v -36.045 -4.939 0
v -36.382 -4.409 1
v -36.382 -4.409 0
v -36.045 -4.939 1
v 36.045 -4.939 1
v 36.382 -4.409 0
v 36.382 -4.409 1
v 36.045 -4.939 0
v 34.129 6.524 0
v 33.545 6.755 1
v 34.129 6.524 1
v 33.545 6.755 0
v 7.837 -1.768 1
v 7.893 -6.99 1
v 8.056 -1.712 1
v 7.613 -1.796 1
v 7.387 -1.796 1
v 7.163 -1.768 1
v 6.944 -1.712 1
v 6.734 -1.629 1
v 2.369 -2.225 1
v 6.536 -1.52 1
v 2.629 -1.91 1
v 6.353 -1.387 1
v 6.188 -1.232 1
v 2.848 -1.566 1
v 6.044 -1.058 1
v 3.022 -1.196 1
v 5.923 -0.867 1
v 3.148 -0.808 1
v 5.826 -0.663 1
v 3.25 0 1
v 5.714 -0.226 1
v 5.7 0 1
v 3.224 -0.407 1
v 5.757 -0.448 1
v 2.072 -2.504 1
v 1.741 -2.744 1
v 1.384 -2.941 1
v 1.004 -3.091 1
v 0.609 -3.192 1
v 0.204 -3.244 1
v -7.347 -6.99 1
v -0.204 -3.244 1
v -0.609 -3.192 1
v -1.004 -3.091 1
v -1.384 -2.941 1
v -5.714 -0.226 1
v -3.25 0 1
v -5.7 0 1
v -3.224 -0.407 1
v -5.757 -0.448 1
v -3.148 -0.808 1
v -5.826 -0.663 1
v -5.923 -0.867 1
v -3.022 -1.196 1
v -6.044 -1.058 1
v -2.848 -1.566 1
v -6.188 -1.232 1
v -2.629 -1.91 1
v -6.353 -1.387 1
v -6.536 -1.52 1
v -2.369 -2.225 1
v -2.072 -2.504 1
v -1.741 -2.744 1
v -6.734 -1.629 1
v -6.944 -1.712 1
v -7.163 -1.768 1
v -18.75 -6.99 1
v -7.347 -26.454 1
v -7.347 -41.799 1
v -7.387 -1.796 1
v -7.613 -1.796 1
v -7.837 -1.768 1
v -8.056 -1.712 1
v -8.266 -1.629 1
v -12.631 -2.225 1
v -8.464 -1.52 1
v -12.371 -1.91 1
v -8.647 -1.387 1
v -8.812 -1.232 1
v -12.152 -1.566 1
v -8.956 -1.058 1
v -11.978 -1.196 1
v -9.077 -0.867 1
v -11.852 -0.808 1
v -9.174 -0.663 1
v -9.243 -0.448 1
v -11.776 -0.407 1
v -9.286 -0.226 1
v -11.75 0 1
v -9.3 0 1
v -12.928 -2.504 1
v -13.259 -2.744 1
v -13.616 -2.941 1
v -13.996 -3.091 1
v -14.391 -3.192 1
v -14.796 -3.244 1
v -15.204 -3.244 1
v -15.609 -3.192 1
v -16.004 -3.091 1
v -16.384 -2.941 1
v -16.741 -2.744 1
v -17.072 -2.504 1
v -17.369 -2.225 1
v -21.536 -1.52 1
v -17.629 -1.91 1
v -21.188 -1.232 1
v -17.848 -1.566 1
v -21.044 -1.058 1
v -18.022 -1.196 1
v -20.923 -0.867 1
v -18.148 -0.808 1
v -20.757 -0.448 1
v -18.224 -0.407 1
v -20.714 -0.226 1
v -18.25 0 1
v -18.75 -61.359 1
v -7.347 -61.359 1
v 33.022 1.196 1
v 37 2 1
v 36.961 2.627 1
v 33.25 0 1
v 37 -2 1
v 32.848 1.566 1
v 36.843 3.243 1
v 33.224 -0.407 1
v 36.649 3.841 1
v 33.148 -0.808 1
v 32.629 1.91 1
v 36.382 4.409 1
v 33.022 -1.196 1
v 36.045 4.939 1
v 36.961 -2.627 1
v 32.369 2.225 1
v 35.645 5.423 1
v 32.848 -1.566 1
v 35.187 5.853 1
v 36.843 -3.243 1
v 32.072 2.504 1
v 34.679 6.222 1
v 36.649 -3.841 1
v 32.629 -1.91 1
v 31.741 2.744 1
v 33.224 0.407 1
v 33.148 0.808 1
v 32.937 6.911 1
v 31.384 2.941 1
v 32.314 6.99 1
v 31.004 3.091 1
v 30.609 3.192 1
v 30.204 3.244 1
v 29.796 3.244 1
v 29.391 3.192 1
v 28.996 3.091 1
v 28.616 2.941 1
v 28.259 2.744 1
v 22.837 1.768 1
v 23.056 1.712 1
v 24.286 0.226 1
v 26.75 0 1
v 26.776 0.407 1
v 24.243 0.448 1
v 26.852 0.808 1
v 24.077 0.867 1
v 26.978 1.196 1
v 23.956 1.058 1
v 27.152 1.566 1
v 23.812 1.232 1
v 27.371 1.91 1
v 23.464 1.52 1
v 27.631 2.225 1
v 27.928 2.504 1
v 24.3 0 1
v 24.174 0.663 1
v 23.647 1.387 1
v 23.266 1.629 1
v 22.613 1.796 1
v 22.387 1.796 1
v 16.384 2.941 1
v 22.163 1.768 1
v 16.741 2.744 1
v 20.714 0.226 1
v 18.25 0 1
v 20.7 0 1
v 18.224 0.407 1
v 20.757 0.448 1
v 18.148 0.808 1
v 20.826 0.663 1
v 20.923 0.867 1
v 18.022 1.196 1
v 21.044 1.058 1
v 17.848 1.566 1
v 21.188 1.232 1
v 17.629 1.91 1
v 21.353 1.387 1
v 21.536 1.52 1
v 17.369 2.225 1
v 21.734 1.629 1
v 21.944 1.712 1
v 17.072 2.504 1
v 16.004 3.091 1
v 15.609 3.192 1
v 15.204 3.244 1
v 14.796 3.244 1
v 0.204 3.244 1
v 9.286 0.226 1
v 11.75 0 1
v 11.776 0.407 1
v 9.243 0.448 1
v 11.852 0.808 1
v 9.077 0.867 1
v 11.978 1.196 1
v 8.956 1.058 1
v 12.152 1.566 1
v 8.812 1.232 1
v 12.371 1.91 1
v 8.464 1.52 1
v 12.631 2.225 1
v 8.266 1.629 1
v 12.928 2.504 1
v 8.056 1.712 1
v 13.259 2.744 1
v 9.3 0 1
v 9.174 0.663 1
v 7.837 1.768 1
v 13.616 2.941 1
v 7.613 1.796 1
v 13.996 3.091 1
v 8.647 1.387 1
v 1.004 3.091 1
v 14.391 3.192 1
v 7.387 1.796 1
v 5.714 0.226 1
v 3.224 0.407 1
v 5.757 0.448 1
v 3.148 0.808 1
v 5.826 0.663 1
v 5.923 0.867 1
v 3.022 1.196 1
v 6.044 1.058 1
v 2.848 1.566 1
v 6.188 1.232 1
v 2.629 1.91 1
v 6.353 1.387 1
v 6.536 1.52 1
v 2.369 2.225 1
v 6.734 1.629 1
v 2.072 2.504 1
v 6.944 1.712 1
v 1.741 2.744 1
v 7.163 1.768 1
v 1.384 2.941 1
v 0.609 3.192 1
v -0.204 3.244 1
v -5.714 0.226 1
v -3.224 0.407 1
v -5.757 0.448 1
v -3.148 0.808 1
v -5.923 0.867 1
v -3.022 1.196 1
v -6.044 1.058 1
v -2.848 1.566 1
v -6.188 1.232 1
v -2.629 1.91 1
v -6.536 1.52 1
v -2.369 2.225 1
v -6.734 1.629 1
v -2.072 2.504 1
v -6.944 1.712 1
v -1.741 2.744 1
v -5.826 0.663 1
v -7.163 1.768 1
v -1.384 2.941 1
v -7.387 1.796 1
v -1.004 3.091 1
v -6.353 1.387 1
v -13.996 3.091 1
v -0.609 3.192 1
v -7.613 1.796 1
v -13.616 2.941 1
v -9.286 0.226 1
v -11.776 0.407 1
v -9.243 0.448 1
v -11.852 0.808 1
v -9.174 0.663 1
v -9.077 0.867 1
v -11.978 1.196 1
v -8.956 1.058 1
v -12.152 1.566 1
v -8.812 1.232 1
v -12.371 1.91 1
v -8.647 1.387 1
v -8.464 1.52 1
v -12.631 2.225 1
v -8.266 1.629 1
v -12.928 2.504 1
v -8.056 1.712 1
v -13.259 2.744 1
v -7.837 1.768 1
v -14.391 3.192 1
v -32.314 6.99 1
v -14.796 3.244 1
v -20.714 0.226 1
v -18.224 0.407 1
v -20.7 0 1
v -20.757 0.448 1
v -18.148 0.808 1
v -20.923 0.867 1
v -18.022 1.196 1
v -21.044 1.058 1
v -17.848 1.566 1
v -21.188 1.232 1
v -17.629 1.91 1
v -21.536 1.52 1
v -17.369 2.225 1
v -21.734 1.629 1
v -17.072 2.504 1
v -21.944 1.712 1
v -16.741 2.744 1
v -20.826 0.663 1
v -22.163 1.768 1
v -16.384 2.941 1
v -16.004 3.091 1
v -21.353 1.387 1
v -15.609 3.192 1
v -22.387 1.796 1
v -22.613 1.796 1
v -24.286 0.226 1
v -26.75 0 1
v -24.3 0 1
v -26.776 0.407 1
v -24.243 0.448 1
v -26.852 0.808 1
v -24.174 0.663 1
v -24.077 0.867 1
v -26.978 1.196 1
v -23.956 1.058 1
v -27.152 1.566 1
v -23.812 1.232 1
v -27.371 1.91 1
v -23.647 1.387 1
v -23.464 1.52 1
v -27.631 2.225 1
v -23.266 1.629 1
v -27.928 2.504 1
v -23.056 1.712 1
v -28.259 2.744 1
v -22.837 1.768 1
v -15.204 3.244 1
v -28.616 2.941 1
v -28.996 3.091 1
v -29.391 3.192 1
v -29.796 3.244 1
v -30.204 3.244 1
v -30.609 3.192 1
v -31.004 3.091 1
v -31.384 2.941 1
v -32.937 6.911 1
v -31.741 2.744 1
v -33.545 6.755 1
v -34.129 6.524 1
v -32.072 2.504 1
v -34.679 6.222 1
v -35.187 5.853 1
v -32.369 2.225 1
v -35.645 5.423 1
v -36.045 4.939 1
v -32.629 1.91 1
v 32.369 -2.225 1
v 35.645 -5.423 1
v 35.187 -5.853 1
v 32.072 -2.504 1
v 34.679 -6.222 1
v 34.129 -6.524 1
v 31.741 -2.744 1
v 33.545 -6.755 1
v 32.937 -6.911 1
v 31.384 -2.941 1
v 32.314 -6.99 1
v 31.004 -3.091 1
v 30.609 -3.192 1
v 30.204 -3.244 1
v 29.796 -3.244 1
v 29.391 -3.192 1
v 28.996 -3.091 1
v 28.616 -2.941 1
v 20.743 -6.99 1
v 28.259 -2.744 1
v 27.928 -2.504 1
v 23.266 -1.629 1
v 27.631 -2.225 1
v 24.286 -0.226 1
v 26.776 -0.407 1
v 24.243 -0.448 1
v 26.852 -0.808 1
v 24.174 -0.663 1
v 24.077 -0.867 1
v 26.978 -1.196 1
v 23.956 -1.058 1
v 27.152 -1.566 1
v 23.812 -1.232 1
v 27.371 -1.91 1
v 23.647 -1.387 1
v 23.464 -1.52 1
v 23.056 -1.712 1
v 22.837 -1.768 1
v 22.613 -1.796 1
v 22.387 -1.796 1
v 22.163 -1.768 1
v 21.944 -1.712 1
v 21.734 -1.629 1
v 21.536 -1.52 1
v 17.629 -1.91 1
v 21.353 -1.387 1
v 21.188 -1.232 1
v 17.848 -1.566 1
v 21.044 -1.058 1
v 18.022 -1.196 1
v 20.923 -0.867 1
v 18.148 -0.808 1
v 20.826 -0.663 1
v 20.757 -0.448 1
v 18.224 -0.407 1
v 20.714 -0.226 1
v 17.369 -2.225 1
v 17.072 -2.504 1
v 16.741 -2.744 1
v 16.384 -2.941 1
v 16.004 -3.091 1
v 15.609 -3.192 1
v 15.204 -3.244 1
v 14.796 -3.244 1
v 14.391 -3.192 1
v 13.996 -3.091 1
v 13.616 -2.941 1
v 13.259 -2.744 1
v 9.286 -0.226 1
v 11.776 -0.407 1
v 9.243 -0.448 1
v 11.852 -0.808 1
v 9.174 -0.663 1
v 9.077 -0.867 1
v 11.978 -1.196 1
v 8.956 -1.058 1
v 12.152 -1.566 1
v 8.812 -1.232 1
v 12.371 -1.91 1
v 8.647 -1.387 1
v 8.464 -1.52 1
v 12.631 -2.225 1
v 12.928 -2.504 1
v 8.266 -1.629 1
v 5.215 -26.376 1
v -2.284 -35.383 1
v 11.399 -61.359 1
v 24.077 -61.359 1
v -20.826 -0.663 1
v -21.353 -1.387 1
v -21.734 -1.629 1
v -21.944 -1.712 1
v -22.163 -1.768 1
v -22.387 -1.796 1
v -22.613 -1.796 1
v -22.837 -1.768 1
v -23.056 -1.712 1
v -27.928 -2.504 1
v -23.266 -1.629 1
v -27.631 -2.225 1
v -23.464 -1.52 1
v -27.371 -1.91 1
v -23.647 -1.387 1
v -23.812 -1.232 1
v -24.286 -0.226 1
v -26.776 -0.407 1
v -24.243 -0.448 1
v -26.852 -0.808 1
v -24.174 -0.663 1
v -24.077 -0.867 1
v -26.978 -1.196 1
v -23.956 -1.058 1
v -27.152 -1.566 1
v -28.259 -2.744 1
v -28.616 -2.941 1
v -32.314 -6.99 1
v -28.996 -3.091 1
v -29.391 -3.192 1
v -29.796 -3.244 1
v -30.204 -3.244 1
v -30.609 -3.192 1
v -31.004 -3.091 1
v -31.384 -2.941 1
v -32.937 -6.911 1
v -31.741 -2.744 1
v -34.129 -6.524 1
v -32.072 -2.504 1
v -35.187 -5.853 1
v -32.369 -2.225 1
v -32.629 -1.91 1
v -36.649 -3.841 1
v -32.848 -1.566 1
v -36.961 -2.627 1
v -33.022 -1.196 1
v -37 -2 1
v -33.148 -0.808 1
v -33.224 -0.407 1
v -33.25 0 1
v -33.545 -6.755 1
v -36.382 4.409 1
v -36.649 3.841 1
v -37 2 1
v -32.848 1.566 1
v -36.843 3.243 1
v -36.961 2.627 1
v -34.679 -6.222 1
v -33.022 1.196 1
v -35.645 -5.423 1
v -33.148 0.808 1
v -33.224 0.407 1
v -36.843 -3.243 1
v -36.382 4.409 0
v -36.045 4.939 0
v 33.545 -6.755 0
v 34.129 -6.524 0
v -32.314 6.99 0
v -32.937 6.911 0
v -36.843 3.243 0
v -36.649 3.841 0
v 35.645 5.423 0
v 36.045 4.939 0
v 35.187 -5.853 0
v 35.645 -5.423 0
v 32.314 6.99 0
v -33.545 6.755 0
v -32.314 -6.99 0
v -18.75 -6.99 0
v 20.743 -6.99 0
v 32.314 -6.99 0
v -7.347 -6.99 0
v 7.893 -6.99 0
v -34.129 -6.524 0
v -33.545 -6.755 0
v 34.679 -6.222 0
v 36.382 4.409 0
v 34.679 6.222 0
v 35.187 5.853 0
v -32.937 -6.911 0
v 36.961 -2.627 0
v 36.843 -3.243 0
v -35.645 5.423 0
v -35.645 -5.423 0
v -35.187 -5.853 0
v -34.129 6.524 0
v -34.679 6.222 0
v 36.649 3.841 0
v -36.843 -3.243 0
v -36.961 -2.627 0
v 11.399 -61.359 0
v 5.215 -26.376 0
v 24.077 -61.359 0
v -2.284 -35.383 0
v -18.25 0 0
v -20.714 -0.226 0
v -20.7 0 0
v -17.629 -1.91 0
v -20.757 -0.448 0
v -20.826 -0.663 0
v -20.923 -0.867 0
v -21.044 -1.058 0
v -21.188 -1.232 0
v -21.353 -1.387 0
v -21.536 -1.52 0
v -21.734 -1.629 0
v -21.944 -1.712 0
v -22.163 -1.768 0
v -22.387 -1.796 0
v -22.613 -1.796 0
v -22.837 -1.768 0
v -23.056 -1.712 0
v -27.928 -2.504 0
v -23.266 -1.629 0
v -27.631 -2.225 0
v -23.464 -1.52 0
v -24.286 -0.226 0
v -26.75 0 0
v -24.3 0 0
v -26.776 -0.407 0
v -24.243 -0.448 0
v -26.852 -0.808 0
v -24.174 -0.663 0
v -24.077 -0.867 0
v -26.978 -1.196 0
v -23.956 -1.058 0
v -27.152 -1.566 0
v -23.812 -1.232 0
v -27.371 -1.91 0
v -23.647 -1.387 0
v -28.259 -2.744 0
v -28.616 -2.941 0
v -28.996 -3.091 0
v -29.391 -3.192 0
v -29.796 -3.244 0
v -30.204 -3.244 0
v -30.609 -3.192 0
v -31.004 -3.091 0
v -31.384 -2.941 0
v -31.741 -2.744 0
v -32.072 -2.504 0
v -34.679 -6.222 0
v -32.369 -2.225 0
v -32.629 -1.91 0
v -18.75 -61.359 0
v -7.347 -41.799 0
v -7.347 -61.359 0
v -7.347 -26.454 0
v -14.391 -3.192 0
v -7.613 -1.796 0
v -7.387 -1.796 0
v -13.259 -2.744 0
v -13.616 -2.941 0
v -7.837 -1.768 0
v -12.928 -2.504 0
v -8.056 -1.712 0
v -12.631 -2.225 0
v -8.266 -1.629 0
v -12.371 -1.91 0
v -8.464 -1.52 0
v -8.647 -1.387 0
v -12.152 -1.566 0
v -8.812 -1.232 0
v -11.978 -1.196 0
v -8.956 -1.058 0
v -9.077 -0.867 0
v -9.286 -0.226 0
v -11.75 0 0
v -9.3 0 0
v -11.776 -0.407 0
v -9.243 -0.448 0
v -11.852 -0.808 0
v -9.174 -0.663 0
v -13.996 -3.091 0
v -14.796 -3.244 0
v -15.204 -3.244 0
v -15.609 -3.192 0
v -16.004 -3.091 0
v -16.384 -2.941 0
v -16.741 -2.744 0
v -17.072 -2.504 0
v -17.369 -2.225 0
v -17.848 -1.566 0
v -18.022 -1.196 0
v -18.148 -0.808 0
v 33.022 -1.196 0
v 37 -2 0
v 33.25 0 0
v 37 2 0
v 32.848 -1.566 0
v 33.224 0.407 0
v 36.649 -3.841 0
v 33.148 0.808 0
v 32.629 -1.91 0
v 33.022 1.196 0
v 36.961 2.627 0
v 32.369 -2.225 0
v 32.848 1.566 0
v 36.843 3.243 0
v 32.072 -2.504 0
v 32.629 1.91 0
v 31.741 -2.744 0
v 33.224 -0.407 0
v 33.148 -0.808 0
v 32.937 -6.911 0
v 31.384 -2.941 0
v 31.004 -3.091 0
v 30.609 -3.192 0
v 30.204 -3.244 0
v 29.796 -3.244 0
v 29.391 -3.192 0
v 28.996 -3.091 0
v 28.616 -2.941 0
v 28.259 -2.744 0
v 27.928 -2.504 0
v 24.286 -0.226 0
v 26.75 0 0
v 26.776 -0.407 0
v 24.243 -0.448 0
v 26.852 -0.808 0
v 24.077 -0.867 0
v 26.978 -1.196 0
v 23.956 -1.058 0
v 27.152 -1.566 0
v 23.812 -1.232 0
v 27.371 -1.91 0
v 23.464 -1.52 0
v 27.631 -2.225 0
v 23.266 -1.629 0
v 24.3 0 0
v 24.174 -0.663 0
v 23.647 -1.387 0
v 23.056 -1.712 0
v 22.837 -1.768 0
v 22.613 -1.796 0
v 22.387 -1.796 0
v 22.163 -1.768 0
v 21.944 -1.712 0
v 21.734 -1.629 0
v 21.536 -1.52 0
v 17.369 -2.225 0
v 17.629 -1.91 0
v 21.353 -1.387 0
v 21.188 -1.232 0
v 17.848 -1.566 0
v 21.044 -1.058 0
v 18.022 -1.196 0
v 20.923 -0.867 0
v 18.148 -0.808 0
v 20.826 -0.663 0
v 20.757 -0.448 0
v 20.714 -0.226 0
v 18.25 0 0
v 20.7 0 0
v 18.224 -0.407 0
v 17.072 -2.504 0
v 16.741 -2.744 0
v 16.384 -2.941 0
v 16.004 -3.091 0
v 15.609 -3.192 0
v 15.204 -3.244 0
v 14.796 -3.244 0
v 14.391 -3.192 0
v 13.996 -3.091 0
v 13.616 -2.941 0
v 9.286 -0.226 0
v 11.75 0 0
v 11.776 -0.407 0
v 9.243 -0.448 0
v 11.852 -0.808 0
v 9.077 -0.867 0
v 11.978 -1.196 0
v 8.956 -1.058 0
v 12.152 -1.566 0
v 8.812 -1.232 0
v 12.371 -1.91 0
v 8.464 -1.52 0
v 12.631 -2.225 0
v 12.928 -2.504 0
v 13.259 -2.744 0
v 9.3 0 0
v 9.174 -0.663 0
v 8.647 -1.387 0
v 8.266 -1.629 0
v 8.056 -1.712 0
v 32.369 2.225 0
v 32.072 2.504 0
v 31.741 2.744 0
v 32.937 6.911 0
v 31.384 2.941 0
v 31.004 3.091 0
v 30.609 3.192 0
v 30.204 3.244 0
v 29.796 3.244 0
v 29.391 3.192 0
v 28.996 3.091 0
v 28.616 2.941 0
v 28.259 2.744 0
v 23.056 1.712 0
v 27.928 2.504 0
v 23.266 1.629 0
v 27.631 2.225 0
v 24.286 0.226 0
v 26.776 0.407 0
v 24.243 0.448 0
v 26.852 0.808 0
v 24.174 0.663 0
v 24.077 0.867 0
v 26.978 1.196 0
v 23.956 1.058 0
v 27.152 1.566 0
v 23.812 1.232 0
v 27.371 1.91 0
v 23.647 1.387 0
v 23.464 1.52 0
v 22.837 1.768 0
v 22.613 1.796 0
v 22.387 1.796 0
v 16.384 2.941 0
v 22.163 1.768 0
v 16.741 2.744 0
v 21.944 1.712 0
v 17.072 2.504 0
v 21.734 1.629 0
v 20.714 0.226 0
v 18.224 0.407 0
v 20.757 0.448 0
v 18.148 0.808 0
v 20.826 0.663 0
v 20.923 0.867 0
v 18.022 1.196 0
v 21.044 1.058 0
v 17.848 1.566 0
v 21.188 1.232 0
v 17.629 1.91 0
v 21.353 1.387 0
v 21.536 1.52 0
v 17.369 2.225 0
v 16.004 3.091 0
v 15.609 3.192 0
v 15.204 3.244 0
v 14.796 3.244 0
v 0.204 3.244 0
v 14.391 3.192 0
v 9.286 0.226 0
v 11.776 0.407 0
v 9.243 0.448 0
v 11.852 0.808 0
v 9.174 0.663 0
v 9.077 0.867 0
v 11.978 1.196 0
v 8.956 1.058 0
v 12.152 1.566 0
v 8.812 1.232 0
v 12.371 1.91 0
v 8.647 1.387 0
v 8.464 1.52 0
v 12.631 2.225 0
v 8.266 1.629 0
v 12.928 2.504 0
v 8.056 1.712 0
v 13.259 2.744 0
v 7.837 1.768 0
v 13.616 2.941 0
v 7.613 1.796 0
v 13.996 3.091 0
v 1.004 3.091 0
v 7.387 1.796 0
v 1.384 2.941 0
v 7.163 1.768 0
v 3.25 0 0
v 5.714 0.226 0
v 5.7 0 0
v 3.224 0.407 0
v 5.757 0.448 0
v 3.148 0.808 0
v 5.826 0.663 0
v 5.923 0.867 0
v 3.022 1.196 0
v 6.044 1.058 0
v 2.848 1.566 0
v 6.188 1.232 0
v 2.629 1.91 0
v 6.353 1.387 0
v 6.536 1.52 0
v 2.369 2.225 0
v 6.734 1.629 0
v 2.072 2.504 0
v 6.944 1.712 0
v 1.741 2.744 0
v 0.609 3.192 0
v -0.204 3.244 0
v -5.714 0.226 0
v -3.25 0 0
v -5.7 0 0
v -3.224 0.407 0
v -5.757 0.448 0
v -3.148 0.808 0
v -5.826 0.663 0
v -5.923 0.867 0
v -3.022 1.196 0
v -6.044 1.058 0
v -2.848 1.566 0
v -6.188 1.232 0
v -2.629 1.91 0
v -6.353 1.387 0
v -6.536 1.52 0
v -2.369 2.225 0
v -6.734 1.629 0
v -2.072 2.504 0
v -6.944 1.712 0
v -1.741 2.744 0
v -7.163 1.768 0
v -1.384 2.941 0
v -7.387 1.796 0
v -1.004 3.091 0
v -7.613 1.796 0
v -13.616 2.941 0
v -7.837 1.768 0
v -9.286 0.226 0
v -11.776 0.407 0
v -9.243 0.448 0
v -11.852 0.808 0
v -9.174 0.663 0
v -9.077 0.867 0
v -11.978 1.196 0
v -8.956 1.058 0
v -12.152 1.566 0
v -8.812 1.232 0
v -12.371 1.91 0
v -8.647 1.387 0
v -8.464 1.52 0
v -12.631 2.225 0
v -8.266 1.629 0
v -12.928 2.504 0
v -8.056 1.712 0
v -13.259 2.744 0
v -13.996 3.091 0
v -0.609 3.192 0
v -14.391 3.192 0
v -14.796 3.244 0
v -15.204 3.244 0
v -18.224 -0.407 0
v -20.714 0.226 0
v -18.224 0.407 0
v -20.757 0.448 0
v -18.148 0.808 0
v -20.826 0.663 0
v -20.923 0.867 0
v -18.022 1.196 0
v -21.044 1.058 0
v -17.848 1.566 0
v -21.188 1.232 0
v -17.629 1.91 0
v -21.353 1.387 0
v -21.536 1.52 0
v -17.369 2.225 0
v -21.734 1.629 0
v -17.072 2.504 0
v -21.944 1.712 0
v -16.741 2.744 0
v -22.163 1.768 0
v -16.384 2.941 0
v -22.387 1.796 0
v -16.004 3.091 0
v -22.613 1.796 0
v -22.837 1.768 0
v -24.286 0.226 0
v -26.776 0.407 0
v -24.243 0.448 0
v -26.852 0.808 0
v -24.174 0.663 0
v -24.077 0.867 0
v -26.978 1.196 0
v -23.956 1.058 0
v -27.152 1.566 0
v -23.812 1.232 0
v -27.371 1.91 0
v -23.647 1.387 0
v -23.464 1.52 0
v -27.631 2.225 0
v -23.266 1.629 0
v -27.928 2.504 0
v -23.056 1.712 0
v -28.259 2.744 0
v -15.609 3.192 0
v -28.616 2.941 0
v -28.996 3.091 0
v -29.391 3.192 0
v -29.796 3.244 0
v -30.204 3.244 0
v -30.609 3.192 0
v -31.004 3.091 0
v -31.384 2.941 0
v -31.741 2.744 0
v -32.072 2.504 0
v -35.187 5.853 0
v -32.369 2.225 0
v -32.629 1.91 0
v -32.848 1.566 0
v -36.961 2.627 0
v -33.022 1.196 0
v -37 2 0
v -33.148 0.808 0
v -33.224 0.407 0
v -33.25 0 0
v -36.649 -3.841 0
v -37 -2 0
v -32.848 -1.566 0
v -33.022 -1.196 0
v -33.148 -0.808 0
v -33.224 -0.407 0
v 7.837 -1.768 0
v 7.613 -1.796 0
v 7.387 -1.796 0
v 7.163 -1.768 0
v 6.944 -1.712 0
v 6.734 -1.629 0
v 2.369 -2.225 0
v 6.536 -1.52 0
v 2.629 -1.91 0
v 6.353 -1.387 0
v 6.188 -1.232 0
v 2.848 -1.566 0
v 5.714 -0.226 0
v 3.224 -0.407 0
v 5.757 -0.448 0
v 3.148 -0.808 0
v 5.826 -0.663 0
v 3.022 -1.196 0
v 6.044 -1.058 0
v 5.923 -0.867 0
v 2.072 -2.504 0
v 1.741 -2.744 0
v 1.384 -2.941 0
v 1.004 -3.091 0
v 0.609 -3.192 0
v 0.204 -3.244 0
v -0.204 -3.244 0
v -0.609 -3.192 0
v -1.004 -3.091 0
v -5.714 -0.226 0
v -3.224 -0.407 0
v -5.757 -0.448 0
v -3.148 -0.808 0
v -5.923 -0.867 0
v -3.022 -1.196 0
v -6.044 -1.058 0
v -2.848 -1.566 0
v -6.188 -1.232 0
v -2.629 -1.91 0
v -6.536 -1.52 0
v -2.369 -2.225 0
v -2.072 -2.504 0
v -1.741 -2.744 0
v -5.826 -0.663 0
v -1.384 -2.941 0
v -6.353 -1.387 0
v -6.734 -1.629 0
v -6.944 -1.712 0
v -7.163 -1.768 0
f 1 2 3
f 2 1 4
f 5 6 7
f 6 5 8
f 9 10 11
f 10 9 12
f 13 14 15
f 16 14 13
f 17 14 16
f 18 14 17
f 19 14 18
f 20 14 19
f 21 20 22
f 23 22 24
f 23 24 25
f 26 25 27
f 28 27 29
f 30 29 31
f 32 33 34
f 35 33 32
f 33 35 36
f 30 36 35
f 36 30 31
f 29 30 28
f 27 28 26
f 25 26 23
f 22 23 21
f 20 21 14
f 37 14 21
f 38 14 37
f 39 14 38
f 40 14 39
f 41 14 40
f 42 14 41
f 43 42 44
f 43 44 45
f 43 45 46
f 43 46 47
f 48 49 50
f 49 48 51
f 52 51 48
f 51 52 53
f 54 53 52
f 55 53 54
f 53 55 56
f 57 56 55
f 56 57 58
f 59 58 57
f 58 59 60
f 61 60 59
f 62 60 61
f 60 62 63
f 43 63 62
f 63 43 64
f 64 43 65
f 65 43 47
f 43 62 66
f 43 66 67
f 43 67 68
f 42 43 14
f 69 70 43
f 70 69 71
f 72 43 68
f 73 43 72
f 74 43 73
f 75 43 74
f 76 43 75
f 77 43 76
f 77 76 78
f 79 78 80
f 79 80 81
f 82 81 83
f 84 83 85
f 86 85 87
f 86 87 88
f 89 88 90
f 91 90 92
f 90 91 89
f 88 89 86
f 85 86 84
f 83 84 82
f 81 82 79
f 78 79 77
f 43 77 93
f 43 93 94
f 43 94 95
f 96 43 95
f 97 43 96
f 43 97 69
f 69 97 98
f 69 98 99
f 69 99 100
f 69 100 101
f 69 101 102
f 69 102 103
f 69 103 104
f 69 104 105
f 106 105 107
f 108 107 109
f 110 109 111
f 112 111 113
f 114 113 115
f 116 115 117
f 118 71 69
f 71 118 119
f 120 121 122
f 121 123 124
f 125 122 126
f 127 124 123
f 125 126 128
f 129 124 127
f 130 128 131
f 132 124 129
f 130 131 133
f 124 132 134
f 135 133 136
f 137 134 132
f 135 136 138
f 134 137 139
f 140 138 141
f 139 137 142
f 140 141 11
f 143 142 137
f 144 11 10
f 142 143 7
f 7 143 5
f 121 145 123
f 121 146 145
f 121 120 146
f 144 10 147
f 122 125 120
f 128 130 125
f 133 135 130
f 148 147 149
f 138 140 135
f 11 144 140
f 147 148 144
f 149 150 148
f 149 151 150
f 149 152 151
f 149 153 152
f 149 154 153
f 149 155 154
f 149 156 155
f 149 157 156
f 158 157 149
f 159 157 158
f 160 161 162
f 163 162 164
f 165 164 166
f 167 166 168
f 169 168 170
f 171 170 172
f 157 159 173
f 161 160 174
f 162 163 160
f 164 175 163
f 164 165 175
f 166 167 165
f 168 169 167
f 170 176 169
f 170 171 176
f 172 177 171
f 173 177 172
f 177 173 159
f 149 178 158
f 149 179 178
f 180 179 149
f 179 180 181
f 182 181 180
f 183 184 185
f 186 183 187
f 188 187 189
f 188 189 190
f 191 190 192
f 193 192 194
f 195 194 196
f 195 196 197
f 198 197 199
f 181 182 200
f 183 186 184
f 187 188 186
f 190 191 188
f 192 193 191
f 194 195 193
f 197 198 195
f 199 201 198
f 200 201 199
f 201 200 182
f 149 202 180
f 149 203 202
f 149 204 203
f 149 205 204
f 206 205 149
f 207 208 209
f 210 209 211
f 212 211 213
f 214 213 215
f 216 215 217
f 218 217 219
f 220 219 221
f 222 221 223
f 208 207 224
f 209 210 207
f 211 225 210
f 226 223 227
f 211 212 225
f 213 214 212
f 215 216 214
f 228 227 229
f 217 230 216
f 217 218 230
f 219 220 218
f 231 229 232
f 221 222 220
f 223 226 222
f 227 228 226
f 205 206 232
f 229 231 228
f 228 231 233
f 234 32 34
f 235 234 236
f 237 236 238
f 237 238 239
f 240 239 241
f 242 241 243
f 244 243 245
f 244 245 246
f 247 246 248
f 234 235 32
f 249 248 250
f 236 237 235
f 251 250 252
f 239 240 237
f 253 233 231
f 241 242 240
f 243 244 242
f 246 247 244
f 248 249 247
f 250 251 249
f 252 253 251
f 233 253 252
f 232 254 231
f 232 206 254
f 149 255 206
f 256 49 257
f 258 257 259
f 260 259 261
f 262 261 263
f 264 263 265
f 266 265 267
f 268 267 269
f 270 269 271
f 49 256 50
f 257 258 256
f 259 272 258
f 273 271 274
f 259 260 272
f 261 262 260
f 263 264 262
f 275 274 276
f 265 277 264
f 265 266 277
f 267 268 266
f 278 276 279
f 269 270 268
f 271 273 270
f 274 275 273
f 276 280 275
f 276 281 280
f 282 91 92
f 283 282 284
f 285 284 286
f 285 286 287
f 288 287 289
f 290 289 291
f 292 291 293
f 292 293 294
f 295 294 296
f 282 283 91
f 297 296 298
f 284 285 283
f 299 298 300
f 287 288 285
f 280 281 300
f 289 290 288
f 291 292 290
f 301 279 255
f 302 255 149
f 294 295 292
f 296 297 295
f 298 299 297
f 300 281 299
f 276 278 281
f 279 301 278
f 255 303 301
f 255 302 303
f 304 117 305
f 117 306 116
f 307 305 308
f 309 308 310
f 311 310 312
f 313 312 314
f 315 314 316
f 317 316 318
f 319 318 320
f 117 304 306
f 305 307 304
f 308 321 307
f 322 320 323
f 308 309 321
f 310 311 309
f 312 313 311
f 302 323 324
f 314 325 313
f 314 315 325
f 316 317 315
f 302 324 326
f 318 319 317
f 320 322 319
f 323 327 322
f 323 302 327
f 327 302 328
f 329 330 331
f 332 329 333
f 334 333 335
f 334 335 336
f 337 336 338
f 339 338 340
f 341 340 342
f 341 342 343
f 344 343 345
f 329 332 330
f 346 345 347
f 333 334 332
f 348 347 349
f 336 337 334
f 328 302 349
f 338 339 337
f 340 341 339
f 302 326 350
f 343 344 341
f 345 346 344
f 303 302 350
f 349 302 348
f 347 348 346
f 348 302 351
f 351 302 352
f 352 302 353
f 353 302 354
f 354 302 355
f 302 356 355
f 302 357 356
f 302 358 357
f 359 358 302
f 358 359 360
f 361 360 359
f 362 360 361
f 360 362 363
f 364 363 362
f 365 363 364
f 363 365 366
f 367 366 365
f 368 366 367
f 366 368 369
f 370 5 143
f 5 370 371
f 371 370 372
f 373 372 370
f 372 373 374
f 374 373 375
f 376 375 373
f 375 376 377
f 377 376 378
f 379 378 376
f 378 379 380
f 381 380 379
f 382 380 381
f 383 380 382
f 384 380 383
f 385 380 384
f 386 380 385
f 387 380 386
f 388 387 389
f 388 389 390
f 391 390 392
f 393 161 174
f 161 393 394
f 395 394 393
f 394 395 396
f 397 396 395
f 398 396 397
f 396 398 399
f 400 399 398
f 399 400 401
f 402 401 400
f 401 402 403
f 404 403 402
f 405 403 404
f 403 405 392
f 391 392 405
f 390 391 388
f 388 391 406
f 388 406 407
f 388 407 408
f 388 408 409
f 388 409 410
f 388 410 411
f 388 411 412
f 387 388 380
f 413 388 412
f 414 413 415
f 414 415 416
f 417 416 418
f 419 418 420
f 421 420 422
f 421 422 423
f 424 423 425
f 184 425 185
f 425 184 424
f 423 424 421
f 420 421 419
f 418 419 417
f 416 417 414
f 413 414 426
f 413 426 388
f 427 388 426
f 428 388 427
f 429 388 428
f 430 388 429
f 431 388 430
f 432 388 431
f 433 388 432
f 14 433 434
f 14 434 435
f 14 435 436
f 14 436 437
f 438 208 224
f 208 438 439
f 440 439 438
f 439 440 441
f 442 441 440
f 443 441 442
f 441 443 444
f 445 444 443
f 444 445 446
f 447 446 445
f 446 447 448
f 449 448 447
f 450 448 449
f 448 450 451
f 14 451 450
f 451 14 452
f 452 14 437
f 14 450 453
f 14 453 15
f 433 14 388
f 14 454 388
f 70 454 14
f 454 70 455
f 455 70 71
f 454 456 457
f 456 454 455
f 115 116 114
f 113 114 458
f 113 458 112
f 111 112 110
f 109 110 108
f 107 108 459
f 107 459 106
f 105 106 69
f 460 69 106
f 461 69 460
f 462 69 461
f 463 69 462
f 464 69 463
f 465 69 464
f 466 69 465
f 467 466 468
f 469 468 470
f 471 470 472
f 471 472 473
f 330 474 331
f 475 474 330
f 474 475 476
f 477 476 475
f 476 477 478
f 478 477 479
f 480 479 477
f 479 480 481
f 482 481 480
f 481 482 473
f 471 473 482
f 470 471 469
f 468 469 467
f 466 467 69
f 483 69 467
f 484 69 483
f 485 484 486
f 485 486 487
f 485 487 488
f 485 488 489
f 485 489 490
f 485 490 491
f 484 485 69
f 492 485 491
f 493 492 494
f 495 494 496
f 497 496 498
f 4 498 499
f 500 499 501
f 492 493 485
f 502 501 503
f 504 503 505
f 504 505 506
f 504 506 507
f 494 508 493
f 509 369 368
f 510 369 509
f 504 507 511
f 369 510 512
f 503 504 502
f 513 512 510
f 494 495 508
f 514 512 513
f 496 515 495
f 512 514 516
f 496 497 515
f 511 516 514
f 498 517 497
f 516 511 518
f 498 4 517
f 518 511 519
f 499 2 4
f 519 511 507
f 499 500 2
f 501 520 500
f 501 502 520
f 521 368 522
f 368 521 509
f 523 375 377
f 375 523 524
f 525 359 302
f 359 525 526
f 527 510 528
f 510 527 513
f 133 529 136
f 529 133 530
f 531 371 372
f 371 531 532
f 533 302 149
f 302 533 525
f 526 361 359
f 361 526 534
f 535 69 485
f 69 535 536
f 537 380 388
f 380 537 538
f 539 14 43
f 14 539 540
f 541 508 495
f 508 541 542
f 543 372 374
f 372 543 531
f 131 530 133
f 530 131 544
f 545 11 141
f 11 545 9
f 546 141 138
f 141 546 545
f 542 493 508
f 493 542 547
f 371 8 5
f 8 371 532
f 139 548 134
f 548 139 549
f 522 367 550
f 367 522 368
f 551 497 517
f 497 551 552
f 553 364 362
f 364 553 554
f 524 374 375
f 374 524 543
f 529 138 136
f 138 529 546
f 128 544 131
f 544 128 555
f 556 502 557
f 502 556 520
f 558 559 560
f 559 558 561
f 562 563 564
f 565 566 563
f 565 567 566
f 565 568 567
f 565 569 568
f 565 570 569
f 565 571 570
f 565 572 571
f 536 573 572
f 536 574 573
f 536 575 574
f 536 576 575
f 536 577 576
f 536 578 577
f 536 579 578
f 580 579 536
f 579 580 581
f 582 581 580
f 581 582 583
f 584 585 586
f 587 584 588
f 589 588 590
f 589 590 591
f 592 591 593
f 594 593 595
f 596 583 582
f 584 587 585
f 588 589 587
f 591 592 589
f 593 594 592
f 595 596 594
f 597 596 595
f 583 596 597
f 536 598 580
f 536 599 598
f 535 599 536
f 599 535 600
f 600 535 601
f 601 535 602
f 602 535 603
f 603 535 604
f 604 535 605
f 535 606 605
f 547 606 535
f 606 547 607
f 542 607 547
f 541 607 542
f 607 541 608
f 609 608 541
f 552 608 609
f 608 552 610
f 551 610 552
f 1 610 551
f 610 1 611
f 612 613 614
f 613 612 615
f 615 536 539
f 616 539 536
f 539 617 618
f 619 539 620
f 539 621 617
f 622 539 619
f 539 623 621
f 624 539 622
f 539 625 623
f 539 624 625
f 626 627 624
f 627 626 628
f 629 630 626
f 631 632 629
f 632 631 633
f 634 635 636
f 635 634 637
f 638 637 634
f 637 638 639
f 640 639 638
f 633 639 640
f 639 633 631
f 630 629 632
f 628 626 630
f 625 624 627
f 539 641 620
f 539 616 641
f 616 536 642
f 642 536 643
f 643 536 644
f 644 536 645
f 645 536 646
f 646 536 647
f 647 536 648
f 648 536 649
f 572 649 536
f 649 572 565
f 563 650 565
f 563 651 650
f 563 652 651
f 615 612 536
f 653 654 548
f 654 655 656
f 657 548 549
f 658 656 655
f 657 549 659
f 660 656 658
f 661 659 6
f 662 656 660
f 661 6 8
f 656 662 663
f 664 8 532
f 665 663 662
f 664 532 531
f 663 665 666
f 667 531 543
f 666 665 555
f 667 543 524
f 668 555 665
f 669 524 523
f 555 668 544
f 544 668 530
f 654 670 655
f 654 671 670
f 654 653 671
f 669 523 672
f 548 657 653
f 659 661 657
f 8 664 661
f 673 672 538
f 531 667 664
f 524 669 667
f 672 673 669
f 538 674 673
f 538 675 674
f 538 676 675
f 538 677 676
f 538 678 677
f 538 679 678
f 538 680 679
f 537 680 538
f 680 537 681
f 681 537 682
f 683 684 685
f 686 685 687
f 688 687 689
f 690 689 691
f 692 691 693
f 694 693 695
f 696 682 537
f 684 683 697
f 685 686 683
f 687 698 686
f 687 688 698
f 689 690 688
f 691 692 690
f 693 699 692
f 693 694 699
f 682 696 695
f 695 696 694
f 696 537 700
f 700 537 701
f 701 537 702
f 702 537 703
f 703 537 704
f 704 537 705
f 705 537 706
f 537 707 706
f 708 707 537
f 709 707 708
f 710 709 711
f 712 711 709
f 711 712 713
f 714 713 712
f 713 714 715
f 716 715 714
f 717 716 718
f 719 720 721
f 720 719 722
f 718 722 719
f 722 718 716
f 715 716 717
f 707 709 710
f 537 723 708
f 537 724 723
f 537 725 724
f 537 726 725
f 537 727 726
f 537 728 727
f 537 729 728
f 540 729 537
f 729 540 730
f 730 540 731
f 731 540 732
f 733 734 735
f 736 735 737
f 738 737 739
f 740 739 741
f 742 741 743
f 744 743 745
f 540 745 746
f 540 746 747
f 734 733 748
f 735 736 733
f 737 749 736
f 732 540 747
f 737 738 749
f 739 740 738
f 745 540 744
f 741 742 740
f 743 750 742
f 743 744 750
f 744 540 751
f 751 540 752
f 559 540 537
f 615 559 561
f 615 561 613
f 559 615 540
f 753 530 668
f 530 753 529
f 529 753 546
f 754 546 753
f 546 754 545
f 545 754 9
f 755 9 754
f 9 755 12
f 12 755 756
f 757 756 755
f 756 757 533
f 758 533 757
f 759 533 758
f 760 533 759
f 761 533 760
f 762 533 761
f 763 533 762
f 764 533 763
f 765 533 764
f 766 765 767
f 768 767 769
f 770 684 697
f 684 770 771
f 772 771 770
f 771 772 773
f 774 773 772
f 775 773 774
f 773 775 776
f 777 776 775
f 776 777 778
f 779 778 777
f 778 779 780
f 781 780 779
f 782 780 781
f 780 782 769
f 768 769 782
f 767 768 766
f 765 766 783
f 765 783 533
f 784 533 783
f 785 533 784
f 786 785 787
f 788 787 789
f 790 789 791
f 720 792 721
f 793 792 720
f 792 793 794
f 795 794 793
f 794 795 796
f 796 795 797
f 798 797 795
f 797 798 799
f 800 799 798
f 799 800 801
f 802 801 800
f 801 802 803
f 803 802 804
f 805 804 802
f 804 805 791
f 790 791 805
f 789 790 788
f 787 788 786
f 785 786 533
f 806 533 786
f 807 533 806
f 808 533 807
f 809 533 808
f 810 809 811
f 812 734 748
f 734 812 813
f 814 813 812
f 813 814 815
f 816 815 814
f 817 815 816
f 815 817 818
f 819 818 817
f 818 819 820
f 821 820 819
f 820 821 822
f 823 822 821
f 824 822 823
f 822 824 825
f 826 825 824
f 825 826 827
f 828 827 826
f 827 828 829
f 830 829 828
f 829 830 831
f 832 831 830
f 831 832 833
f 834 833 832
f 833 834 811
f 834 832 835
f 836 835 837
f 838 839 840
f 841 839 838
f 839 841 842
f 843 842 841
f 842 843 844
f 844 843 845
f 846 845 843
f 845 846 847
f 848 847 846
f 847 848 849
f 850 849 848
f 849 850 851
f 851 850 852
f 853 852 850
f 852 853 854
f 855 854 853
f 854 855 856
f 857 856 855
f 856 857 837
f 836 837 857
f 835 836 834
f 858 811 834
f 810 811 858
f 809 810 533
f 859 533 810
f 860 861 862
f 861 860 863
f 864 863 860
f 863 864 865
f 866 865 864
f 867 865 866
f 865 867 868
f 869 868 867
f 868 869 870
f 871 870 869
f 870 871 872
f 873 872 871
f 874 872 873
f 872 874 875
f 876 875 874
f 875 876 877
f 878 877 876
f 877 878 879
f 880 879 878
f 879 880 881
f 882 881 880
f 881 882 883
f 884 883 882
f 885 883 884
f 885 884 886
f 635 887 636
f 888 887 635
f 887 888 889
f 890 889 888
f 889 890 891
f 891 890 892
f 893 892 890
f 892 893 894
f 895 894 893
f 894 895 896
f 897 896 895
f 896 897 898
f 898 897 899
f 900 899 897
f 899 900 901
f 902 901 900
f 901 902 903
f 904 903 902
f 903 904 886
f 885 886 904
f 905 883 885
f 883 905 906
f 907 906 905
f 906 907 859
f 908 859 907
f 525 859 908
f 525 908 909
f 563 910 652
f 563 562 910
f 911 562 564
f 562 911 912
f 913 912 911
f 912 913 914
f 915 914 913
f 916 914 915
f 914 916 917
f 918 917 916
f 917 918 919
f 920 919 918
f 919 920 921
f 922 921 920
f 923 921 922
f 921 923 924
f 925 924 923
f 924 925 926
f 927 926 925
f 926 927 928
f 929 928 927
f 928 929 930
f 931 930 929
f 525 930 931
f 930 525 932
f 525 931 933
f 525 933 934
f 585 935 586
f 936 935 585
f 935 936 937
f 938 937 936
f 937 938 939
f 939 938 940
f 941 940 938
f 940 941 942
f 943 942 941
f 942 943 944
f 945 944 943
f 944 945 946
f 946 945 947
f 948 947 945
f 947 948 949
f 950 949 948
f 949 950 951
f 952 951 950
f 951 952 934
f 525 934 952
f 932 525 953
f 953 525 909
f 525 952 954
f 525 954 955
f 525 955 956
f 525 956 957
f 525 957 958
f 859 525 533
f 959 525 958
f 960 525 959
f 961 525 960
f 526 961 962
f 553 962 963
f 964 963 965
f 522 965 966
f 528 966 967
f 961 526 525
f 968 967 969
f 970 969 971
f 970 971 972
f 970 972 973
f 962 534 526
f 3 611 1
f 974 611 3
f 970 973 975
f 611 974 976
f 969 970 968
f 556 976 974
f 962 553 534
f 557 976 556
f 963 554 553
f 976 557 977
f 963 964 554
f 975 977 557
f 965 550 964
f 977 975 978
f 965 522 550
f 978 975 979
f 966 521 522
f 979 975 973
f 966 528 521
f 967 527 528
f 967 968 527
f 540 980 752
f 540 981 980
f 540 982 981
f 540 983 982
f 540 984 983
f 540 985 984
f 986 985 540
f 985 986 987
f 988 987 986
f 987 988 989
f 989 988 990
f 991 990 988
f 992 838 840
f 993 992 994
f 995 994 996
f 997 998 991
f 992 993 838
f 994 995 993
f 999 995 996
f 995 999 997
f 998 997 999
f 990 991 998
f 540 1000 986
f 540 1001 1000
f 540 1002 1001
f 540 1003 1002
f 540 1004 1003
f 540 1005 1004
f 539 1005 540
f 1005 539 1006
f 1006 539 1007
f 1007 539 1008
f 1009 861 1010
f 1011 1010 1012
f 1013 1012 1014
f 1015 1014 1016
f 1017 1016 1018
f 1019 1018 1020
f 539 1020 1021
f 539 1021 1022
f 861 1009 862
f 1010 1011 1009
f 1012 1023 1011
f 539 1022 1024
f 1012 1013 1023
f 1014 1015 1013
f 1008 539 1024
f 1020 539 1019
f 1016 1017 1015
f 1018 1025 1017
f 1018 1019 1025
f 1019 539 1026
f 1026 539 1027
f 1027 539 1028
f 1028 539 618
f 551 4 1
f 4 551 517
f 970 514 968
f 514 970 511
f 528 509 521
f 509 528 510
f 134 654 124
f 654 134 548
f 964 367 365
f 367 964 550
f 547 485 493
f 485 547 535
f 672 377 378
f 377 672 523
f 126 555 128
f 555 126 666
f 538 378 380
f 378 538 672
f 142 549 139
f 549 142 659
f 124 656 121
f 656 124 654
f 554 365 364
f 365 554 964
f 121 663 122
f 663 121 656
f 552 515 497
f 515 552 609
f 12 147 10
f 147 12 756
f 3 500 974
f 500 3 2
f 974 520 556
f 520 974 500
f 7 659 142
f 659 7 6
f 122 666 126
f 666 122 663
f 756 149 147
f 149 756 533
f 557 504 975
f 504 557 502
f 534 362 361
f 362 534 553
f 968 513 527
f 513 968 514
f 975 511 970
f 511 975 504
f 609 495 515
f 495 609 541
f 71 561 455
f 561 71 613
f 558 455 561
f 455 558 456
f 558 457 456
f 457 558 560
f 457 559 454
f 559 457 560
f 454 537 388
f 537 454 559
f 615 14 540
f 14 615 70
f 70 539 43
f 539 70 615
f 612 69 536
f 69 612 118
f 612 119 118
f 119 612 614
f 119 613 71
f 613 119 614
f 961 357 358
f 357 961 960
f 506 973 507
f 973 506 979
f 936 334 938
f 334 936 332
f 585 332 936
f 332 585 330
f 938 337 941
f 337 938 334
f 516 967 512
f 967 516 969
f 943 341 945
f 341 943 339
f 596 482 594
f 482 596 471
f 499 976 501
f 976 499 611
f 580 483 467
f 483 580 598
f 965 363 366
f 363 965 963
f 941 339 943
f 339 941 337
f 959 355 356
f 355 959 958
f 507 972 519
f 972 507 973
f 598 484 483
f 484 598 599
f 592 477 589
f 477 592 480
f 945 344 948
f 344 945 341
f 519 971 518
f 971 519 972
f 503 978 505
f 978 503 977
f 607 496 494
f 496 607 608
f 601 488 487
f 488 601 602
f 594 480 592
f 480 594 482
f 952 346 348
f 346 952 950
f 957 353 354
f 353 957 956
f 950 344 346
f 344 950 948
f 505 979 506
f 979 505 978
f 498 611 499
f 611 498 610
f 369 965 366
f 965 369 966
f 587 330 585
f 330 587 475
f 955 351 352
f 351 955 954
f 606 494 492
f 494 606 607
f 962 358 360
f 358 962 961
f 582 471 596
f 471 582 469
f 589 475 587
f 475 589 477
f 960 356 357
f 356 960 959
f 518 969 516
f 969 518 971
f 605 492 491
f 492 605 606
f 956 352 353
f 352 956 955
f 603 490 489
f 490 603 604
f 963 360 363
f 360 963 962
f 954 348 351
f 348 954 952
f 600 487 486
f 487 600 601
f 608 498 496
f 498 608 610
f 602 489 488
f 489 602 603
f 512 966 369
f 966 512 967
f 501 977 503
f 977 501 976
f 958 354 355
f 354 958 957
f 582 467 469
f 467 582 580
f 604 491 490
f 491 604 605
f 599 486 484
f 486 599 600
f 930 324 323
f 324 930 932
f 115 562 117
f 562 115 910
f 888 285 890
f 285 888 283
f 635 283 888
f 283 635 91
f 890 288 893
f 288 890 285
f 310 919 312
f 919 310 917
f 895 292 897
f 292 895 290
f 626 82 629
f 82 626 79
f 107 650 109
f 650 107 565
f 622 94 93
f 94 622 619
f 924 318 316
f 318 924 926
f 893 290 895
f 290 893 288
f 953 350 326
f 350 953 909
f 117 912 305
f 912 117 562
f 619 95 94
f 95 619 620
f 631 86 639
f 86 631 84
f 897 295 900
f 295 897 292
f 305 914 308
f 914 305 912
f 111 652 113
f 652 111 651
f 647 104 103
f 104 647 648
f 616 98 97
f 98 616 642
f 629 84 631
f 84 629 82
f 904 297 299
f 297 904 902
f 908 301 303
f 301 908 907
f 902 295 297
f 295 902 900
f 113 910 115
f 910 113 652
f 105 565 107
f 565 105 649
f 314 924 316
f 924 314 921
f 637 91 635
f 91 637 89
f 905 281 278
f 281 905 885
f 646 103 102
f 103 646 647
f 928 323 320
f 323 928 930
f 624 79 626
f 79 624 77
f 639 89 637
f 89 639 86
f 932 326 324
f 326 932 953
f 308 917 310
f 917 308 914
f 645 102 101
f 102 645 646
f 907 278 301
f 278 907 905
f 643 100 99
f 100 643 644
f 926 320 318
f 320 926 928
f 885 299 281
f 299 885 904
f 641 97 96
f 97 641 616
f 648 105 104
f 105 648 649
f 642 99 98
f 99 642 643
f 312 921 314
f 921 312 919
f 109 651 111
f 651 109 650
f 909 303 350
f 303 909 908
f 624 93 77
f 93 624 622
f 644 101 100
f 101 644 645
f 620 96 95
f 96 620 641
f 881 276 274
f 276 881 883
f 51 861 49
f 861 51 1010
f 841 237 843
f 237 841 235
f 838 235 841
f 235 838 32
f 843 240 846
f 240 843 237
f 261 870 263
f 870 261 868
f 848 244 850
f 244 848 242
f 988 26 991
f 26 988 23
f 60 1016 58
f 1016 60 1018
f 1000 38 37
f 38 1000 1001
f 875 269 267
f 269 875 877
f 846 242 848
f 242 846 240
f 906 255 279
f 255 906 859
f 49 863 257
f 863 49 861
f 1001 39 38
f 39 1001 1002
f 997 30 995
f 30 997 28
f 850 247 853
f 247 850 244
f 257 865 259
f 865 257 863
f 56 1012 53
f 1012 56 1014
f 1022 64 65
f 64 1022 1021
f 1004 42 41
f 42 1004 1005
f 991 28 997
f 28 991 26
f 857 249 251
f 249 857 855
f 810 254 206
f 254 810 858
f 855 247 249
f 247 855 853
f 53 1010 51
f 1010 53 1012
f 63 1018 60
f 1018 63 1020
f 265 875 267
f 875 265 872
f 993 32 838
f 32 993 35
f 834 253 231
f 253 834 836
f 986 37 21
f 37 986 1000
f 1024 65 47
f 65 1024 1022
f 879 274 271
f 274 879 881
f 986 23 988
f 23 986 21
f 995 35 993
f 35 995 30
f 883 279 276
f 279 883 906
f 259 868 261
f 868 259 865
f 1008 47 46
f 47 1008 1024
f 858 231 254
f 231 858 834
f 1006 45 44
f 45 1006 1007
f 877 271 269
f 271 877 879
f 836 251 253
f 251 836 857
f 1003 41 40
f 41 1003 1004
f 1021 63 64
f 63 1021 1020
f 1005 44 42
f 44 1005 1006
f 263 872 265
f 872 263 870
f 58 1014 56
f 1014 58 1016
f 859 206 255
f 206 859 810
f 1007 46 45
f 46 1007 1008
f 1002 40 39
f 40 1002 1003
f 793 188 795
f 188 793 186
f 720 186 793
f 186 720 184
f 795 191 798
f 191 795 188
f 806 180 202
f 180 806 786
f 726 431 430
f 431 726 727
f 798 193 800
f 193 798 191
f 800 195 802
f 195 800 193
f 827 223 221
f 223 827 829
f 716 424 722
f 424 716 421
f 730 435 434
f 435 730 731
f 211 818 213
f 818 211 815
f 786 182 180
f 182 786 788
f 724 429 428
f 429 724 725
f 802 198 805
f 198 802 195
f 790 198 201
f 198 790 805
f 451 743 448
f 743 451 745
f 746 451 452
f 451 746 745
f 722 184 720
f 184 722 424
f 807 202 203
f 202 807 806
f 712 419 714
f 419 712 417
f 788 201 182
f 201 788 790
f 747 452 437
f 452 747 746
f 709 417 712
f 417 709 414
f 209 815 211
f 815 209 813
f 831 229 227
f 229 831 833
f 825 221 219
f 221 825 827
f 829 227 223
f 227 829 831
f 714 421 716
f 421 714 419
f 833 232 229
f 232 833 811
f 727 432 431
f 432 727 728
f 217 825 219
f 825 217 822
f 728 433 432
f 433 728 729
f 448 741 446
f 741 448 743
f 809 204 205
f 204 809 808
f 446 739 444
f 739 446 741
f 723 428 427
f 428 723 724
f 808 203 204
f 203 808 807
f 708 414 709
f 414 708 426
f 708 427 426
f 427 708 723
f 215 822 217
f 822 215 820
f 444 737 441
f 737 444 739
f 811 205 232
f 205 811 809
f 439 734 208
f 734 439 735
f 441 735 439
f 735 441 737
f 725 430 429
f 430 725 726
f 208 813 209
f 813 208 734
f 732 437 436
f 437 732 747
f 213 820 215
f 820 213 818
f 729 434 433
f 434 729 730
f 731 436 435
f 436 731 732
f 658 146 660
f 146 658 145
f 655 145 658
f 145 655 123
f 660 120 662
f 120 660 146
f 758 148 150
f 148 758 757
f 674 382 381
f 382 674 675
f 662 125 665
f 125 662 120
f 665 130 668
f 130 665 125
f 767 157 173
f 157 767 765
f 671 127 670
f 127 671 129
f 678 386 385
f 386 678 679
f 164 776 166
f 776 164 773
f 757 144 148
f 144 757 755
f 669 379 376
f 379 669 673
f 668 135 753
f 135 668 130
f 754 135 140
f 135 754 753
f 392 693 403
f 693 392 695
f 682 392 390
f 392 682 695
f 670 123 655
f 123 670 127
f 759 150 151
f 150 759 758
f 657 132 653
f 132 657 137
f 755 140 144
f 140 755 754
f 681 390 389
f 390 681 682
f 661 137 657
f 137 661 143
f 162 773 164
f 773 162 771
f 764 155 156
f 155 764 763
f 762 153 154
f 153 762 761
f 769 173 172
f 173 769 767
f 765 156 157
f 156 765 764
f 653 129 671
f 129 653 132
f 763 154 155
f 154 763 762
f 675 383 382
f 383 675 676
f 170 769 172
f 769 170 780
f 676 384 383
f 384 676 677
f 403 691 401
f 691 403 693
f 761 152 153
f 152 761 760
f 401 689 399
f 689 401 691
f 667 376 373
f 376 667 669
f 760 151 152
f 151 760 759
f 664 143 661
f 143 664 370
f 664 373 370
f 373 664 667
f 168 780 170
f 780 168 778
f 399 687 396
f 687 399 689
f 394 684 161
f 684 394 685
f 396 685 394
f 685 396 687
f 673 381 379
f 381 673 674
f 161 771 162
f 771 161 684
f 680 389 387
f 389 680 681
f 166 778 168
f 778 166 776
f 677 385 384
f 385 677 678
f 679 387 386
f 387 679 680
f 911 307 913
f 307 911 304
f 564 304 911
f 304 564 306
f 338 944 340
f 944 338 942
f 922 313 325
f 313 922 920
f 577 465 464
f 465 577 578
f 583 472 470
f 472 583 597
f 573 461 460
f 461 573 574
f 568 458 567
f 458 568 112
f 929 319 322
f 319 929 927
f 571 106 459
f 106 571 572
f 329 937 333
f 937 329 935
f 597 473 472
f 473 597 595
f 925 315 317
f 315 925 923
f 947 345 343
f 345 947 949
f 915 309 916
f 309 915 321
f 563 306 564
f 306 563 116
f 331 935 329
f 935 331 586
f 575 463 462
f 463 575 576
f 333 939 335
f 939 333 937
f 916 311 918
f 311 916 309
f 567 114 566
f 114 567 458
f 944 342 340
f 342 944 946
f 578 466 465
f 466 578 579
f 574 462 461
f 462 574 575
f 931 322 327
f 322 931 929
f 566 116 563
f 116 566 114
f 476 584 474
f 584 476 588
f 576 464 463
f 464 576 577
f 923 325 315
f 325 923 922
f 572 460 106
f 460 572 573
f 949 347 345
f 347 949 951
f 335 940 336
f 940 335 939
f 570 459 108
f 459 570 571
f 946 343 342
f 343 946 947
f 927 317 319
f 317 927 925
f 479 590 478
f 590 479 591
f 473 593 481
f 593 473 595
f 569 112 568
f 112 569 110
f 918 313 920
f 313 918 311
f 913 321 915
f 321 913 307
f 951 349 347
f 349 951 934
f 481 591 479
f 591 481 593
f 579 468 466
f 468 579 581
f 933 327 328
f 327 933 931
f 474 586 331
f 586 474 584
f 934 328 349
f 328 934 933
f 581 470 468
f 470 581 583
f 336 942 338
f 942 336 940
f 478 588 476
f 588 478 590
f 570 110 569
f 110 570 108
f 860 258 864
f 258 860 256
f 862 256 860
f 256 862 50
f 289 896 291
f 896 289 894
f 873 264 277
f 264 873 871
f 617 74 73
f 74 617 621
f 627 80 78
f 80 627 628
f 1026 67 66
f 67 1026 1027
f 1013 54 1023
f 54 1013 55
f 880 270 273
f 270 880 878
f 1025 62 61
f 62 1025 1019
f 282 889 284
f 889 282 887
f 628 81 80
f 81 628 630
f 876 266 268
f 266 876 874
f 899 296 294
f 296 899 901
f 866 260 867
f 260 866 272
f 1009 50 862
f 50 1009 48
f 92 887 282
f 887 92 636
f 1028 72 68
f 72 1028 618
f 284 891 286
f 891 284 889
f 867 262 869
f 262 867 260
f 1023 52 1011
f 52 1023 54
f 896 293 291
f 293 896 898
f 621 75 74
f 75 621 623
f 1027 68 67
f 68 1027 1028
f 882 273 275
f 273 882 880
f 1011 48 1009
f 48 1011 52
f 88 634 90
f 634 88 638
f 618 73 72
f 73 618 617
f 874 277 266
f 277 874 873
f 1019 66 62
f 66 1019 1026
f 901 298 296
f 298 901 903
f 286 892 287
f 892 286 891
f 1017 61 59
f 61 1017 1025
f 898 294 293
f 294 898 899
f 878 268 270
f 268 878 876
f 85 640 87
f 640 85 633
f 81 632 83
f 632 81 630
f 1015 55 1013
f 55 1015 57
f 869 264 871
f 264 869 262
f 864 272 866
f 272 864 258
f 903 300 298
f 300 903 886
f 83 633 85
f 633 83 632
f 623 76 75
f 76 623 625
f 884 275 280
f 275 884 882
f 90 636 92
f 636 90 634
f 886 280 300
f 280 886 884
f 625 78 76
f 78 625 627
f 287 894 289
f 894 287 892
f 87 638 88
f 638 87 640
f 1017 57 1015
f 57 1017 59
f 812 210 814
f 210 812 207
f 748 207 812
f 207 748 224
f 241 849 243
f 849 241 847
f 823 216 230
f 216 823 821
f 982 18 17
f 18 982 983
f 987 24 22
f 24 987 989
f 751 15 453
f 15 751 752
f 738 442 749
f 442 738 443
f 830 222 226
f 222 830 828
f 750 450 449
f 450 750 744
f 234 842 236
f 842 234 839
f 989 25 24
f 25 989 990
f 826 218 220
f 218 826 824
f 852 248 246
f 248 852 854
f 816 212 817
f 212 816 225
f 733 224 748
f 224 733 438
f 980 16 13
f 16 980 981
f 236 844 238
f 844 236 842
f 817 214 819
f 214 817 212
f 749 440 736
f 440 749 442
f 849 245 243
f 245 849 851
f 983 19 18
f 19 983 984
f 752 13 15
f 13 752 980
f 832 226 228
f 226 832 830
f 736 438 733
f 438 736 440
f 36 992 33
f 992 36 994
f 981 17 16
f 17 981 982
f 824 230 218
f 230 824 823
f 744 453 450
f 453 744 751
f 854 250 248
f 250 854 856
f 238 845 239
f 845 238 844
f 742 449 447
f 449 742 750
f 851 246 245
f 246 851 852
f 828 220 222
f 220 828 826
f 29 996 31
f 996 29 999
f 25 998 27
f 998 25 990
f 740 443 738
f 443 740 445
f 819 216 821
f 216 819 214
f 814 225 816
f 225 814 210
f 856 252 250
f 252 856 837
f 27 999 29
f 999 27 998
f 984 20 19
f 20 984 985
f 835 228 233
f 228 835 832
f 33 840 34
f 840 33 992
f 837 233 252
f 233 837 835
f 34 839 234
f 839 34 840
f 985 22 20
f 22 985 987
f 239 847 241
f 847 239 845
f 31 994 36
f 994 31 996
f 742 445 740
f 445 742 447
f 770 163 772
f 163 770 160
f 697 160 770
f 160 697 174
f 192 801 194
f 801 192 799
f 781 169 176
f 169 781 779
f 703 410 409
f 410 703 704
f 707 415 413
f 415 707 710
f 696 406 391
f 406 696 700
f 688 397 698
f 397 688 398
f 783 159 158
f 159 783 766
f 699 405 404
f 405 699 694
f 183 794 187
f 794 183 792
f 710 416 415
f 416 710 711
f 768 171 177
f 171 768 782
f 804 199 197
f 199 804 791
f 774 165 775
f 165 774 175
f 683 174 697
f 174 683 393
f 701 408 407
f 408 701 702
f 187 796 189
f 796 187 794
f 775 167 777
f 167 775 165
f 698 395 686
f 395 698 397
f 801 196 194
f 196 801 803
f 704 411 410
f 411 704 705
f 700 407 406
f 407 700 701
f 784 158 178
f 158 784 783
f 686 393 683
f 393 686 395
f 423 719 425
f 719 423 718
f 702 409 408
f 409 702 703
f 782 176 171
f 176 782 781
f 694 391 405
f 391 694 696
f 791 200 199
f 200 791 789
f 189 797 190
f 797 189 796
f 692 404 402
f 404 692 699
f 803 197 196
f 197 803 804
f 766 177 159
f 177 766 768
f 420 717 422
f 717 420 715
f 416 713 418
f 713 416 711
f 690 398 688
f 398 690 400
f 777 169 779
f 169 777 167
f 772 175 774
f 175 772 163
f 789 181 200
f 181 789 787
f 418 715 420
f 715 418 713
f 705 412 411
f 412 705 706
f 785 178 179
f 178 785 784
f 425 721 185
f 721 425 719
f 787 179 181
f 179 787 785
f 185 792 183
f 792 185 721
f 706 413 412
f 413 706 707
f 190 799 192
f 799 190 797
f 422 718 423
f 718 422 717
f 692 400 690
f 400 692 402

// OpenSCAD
$fn = 50;


difference() {
	union() {
		hull() {
			translate(v = [-32.0000000000, 2.0000000000, 0]) {
				cylinder(h = 1, r = 5);
			}
			translate(v = [32.0000000000, 2.0000000000, 0]) {
				cylinder(h = 1, r = 5);
			}
			translate(v = [-32.0000000000, -2.0000000000, 0]) {
				cylinder(h = 1, r = 5);
			}
			translate(v = [32.0000000000, -2.0000000000, 0]) {
				cylinder(h = 1, r = 5);
			}
		}
		translate(v = [0, -5, 0]) {
			linear_extrude(height = 1) {
				text(font = "DejaVu Sans Mono:style=Bold", halign = "center", size = 57.0000000000, text = "K", valign = "top");
			}
		}
	}
	union() {
		translate(v = [-30.0000000000, 0.0000000000, 0]) {
			translate(v = [0, 0, -100]) {
				cylinder(h = 200, r = 3.2500000000);
			}
		}
		translate(v = [-15.0000000000, 0.0000000000, 0]) {
			translate(v = [0, 0, -100]) {
				cylinder(h = 200, r = 3.2500000000);
			}
		}
		translate(v = [0, 0, -100]) {
			cylinder(h = 200, r = 3.2500000000);
		}
		translate(v = [15.0000000000, 0.0000000000, 0]) {
			translate(v = [0, 0, -100]) {
				cylinder(h = 200, r = 3.2500000000);
			}
		}
		translate(v = [30.0000000000, 0.0000000000, 0]) {
			translate(v = [0, 0, -100]) {
				cylinder(h = 200, r = 3.2500000000);
			}
		}
		translate(v = [-30.0000000000, 0.0000000000, 0]) {
			translate(v = [0, 0, -100]) {
				cylinder(h = 200, r = 1.8000000000);
			}
		}
		translate(v = [-22.5000000000, 0.0000000000, 0]) {
			translate(v = [0, 0, -100]) {
				cylinder(h = 200, r = 1.8000000000);
			}
		}
		translate(v = [-15.0000000000, 0.0000000000, 0]) {
			translate(v = [0, 0, -100]) {
				cylinder(h = 200, r = 1.8000000000);
			}
		}
		translate(v = [-7.5000000000, 0.0000000000, 0]) {
			translate(v = [0, 0, -100]) {
				cylinder(h = 200, r = 1.8000000000);
			}
		}
		translate(v = [0, 0, -100]) {
			cylinder(h = 200, r = 1.8000000000);
		}
		translate(v = [7.5000000000, 0.0000000000, 0]) {
			translate(v = [0, 0, -100]) {
				cylinder(h = 200, r = 1.8000000000);
			}
		}
		translate(v = [15.0000000000, 0.0000000000, 0]) {
			translate(v = [0, 0, -100]) {
				cylinder(h = 200, r = 1.8000000000);
			}
		}
		translate(v = [22.5000000000, 0.0000000000, 0]) {
			translate(v = [0, 0, -100]) {
				cylinder(h = 200, r = 1.8000000000);
			}
		}
		translate(v = [30.0000000000, 0.0000000000, 0]) {
			translate(v = [0, 0, -100]) {
				cylinder(h = 200, r = 1.8000000000);
			}
		}
	}
}
